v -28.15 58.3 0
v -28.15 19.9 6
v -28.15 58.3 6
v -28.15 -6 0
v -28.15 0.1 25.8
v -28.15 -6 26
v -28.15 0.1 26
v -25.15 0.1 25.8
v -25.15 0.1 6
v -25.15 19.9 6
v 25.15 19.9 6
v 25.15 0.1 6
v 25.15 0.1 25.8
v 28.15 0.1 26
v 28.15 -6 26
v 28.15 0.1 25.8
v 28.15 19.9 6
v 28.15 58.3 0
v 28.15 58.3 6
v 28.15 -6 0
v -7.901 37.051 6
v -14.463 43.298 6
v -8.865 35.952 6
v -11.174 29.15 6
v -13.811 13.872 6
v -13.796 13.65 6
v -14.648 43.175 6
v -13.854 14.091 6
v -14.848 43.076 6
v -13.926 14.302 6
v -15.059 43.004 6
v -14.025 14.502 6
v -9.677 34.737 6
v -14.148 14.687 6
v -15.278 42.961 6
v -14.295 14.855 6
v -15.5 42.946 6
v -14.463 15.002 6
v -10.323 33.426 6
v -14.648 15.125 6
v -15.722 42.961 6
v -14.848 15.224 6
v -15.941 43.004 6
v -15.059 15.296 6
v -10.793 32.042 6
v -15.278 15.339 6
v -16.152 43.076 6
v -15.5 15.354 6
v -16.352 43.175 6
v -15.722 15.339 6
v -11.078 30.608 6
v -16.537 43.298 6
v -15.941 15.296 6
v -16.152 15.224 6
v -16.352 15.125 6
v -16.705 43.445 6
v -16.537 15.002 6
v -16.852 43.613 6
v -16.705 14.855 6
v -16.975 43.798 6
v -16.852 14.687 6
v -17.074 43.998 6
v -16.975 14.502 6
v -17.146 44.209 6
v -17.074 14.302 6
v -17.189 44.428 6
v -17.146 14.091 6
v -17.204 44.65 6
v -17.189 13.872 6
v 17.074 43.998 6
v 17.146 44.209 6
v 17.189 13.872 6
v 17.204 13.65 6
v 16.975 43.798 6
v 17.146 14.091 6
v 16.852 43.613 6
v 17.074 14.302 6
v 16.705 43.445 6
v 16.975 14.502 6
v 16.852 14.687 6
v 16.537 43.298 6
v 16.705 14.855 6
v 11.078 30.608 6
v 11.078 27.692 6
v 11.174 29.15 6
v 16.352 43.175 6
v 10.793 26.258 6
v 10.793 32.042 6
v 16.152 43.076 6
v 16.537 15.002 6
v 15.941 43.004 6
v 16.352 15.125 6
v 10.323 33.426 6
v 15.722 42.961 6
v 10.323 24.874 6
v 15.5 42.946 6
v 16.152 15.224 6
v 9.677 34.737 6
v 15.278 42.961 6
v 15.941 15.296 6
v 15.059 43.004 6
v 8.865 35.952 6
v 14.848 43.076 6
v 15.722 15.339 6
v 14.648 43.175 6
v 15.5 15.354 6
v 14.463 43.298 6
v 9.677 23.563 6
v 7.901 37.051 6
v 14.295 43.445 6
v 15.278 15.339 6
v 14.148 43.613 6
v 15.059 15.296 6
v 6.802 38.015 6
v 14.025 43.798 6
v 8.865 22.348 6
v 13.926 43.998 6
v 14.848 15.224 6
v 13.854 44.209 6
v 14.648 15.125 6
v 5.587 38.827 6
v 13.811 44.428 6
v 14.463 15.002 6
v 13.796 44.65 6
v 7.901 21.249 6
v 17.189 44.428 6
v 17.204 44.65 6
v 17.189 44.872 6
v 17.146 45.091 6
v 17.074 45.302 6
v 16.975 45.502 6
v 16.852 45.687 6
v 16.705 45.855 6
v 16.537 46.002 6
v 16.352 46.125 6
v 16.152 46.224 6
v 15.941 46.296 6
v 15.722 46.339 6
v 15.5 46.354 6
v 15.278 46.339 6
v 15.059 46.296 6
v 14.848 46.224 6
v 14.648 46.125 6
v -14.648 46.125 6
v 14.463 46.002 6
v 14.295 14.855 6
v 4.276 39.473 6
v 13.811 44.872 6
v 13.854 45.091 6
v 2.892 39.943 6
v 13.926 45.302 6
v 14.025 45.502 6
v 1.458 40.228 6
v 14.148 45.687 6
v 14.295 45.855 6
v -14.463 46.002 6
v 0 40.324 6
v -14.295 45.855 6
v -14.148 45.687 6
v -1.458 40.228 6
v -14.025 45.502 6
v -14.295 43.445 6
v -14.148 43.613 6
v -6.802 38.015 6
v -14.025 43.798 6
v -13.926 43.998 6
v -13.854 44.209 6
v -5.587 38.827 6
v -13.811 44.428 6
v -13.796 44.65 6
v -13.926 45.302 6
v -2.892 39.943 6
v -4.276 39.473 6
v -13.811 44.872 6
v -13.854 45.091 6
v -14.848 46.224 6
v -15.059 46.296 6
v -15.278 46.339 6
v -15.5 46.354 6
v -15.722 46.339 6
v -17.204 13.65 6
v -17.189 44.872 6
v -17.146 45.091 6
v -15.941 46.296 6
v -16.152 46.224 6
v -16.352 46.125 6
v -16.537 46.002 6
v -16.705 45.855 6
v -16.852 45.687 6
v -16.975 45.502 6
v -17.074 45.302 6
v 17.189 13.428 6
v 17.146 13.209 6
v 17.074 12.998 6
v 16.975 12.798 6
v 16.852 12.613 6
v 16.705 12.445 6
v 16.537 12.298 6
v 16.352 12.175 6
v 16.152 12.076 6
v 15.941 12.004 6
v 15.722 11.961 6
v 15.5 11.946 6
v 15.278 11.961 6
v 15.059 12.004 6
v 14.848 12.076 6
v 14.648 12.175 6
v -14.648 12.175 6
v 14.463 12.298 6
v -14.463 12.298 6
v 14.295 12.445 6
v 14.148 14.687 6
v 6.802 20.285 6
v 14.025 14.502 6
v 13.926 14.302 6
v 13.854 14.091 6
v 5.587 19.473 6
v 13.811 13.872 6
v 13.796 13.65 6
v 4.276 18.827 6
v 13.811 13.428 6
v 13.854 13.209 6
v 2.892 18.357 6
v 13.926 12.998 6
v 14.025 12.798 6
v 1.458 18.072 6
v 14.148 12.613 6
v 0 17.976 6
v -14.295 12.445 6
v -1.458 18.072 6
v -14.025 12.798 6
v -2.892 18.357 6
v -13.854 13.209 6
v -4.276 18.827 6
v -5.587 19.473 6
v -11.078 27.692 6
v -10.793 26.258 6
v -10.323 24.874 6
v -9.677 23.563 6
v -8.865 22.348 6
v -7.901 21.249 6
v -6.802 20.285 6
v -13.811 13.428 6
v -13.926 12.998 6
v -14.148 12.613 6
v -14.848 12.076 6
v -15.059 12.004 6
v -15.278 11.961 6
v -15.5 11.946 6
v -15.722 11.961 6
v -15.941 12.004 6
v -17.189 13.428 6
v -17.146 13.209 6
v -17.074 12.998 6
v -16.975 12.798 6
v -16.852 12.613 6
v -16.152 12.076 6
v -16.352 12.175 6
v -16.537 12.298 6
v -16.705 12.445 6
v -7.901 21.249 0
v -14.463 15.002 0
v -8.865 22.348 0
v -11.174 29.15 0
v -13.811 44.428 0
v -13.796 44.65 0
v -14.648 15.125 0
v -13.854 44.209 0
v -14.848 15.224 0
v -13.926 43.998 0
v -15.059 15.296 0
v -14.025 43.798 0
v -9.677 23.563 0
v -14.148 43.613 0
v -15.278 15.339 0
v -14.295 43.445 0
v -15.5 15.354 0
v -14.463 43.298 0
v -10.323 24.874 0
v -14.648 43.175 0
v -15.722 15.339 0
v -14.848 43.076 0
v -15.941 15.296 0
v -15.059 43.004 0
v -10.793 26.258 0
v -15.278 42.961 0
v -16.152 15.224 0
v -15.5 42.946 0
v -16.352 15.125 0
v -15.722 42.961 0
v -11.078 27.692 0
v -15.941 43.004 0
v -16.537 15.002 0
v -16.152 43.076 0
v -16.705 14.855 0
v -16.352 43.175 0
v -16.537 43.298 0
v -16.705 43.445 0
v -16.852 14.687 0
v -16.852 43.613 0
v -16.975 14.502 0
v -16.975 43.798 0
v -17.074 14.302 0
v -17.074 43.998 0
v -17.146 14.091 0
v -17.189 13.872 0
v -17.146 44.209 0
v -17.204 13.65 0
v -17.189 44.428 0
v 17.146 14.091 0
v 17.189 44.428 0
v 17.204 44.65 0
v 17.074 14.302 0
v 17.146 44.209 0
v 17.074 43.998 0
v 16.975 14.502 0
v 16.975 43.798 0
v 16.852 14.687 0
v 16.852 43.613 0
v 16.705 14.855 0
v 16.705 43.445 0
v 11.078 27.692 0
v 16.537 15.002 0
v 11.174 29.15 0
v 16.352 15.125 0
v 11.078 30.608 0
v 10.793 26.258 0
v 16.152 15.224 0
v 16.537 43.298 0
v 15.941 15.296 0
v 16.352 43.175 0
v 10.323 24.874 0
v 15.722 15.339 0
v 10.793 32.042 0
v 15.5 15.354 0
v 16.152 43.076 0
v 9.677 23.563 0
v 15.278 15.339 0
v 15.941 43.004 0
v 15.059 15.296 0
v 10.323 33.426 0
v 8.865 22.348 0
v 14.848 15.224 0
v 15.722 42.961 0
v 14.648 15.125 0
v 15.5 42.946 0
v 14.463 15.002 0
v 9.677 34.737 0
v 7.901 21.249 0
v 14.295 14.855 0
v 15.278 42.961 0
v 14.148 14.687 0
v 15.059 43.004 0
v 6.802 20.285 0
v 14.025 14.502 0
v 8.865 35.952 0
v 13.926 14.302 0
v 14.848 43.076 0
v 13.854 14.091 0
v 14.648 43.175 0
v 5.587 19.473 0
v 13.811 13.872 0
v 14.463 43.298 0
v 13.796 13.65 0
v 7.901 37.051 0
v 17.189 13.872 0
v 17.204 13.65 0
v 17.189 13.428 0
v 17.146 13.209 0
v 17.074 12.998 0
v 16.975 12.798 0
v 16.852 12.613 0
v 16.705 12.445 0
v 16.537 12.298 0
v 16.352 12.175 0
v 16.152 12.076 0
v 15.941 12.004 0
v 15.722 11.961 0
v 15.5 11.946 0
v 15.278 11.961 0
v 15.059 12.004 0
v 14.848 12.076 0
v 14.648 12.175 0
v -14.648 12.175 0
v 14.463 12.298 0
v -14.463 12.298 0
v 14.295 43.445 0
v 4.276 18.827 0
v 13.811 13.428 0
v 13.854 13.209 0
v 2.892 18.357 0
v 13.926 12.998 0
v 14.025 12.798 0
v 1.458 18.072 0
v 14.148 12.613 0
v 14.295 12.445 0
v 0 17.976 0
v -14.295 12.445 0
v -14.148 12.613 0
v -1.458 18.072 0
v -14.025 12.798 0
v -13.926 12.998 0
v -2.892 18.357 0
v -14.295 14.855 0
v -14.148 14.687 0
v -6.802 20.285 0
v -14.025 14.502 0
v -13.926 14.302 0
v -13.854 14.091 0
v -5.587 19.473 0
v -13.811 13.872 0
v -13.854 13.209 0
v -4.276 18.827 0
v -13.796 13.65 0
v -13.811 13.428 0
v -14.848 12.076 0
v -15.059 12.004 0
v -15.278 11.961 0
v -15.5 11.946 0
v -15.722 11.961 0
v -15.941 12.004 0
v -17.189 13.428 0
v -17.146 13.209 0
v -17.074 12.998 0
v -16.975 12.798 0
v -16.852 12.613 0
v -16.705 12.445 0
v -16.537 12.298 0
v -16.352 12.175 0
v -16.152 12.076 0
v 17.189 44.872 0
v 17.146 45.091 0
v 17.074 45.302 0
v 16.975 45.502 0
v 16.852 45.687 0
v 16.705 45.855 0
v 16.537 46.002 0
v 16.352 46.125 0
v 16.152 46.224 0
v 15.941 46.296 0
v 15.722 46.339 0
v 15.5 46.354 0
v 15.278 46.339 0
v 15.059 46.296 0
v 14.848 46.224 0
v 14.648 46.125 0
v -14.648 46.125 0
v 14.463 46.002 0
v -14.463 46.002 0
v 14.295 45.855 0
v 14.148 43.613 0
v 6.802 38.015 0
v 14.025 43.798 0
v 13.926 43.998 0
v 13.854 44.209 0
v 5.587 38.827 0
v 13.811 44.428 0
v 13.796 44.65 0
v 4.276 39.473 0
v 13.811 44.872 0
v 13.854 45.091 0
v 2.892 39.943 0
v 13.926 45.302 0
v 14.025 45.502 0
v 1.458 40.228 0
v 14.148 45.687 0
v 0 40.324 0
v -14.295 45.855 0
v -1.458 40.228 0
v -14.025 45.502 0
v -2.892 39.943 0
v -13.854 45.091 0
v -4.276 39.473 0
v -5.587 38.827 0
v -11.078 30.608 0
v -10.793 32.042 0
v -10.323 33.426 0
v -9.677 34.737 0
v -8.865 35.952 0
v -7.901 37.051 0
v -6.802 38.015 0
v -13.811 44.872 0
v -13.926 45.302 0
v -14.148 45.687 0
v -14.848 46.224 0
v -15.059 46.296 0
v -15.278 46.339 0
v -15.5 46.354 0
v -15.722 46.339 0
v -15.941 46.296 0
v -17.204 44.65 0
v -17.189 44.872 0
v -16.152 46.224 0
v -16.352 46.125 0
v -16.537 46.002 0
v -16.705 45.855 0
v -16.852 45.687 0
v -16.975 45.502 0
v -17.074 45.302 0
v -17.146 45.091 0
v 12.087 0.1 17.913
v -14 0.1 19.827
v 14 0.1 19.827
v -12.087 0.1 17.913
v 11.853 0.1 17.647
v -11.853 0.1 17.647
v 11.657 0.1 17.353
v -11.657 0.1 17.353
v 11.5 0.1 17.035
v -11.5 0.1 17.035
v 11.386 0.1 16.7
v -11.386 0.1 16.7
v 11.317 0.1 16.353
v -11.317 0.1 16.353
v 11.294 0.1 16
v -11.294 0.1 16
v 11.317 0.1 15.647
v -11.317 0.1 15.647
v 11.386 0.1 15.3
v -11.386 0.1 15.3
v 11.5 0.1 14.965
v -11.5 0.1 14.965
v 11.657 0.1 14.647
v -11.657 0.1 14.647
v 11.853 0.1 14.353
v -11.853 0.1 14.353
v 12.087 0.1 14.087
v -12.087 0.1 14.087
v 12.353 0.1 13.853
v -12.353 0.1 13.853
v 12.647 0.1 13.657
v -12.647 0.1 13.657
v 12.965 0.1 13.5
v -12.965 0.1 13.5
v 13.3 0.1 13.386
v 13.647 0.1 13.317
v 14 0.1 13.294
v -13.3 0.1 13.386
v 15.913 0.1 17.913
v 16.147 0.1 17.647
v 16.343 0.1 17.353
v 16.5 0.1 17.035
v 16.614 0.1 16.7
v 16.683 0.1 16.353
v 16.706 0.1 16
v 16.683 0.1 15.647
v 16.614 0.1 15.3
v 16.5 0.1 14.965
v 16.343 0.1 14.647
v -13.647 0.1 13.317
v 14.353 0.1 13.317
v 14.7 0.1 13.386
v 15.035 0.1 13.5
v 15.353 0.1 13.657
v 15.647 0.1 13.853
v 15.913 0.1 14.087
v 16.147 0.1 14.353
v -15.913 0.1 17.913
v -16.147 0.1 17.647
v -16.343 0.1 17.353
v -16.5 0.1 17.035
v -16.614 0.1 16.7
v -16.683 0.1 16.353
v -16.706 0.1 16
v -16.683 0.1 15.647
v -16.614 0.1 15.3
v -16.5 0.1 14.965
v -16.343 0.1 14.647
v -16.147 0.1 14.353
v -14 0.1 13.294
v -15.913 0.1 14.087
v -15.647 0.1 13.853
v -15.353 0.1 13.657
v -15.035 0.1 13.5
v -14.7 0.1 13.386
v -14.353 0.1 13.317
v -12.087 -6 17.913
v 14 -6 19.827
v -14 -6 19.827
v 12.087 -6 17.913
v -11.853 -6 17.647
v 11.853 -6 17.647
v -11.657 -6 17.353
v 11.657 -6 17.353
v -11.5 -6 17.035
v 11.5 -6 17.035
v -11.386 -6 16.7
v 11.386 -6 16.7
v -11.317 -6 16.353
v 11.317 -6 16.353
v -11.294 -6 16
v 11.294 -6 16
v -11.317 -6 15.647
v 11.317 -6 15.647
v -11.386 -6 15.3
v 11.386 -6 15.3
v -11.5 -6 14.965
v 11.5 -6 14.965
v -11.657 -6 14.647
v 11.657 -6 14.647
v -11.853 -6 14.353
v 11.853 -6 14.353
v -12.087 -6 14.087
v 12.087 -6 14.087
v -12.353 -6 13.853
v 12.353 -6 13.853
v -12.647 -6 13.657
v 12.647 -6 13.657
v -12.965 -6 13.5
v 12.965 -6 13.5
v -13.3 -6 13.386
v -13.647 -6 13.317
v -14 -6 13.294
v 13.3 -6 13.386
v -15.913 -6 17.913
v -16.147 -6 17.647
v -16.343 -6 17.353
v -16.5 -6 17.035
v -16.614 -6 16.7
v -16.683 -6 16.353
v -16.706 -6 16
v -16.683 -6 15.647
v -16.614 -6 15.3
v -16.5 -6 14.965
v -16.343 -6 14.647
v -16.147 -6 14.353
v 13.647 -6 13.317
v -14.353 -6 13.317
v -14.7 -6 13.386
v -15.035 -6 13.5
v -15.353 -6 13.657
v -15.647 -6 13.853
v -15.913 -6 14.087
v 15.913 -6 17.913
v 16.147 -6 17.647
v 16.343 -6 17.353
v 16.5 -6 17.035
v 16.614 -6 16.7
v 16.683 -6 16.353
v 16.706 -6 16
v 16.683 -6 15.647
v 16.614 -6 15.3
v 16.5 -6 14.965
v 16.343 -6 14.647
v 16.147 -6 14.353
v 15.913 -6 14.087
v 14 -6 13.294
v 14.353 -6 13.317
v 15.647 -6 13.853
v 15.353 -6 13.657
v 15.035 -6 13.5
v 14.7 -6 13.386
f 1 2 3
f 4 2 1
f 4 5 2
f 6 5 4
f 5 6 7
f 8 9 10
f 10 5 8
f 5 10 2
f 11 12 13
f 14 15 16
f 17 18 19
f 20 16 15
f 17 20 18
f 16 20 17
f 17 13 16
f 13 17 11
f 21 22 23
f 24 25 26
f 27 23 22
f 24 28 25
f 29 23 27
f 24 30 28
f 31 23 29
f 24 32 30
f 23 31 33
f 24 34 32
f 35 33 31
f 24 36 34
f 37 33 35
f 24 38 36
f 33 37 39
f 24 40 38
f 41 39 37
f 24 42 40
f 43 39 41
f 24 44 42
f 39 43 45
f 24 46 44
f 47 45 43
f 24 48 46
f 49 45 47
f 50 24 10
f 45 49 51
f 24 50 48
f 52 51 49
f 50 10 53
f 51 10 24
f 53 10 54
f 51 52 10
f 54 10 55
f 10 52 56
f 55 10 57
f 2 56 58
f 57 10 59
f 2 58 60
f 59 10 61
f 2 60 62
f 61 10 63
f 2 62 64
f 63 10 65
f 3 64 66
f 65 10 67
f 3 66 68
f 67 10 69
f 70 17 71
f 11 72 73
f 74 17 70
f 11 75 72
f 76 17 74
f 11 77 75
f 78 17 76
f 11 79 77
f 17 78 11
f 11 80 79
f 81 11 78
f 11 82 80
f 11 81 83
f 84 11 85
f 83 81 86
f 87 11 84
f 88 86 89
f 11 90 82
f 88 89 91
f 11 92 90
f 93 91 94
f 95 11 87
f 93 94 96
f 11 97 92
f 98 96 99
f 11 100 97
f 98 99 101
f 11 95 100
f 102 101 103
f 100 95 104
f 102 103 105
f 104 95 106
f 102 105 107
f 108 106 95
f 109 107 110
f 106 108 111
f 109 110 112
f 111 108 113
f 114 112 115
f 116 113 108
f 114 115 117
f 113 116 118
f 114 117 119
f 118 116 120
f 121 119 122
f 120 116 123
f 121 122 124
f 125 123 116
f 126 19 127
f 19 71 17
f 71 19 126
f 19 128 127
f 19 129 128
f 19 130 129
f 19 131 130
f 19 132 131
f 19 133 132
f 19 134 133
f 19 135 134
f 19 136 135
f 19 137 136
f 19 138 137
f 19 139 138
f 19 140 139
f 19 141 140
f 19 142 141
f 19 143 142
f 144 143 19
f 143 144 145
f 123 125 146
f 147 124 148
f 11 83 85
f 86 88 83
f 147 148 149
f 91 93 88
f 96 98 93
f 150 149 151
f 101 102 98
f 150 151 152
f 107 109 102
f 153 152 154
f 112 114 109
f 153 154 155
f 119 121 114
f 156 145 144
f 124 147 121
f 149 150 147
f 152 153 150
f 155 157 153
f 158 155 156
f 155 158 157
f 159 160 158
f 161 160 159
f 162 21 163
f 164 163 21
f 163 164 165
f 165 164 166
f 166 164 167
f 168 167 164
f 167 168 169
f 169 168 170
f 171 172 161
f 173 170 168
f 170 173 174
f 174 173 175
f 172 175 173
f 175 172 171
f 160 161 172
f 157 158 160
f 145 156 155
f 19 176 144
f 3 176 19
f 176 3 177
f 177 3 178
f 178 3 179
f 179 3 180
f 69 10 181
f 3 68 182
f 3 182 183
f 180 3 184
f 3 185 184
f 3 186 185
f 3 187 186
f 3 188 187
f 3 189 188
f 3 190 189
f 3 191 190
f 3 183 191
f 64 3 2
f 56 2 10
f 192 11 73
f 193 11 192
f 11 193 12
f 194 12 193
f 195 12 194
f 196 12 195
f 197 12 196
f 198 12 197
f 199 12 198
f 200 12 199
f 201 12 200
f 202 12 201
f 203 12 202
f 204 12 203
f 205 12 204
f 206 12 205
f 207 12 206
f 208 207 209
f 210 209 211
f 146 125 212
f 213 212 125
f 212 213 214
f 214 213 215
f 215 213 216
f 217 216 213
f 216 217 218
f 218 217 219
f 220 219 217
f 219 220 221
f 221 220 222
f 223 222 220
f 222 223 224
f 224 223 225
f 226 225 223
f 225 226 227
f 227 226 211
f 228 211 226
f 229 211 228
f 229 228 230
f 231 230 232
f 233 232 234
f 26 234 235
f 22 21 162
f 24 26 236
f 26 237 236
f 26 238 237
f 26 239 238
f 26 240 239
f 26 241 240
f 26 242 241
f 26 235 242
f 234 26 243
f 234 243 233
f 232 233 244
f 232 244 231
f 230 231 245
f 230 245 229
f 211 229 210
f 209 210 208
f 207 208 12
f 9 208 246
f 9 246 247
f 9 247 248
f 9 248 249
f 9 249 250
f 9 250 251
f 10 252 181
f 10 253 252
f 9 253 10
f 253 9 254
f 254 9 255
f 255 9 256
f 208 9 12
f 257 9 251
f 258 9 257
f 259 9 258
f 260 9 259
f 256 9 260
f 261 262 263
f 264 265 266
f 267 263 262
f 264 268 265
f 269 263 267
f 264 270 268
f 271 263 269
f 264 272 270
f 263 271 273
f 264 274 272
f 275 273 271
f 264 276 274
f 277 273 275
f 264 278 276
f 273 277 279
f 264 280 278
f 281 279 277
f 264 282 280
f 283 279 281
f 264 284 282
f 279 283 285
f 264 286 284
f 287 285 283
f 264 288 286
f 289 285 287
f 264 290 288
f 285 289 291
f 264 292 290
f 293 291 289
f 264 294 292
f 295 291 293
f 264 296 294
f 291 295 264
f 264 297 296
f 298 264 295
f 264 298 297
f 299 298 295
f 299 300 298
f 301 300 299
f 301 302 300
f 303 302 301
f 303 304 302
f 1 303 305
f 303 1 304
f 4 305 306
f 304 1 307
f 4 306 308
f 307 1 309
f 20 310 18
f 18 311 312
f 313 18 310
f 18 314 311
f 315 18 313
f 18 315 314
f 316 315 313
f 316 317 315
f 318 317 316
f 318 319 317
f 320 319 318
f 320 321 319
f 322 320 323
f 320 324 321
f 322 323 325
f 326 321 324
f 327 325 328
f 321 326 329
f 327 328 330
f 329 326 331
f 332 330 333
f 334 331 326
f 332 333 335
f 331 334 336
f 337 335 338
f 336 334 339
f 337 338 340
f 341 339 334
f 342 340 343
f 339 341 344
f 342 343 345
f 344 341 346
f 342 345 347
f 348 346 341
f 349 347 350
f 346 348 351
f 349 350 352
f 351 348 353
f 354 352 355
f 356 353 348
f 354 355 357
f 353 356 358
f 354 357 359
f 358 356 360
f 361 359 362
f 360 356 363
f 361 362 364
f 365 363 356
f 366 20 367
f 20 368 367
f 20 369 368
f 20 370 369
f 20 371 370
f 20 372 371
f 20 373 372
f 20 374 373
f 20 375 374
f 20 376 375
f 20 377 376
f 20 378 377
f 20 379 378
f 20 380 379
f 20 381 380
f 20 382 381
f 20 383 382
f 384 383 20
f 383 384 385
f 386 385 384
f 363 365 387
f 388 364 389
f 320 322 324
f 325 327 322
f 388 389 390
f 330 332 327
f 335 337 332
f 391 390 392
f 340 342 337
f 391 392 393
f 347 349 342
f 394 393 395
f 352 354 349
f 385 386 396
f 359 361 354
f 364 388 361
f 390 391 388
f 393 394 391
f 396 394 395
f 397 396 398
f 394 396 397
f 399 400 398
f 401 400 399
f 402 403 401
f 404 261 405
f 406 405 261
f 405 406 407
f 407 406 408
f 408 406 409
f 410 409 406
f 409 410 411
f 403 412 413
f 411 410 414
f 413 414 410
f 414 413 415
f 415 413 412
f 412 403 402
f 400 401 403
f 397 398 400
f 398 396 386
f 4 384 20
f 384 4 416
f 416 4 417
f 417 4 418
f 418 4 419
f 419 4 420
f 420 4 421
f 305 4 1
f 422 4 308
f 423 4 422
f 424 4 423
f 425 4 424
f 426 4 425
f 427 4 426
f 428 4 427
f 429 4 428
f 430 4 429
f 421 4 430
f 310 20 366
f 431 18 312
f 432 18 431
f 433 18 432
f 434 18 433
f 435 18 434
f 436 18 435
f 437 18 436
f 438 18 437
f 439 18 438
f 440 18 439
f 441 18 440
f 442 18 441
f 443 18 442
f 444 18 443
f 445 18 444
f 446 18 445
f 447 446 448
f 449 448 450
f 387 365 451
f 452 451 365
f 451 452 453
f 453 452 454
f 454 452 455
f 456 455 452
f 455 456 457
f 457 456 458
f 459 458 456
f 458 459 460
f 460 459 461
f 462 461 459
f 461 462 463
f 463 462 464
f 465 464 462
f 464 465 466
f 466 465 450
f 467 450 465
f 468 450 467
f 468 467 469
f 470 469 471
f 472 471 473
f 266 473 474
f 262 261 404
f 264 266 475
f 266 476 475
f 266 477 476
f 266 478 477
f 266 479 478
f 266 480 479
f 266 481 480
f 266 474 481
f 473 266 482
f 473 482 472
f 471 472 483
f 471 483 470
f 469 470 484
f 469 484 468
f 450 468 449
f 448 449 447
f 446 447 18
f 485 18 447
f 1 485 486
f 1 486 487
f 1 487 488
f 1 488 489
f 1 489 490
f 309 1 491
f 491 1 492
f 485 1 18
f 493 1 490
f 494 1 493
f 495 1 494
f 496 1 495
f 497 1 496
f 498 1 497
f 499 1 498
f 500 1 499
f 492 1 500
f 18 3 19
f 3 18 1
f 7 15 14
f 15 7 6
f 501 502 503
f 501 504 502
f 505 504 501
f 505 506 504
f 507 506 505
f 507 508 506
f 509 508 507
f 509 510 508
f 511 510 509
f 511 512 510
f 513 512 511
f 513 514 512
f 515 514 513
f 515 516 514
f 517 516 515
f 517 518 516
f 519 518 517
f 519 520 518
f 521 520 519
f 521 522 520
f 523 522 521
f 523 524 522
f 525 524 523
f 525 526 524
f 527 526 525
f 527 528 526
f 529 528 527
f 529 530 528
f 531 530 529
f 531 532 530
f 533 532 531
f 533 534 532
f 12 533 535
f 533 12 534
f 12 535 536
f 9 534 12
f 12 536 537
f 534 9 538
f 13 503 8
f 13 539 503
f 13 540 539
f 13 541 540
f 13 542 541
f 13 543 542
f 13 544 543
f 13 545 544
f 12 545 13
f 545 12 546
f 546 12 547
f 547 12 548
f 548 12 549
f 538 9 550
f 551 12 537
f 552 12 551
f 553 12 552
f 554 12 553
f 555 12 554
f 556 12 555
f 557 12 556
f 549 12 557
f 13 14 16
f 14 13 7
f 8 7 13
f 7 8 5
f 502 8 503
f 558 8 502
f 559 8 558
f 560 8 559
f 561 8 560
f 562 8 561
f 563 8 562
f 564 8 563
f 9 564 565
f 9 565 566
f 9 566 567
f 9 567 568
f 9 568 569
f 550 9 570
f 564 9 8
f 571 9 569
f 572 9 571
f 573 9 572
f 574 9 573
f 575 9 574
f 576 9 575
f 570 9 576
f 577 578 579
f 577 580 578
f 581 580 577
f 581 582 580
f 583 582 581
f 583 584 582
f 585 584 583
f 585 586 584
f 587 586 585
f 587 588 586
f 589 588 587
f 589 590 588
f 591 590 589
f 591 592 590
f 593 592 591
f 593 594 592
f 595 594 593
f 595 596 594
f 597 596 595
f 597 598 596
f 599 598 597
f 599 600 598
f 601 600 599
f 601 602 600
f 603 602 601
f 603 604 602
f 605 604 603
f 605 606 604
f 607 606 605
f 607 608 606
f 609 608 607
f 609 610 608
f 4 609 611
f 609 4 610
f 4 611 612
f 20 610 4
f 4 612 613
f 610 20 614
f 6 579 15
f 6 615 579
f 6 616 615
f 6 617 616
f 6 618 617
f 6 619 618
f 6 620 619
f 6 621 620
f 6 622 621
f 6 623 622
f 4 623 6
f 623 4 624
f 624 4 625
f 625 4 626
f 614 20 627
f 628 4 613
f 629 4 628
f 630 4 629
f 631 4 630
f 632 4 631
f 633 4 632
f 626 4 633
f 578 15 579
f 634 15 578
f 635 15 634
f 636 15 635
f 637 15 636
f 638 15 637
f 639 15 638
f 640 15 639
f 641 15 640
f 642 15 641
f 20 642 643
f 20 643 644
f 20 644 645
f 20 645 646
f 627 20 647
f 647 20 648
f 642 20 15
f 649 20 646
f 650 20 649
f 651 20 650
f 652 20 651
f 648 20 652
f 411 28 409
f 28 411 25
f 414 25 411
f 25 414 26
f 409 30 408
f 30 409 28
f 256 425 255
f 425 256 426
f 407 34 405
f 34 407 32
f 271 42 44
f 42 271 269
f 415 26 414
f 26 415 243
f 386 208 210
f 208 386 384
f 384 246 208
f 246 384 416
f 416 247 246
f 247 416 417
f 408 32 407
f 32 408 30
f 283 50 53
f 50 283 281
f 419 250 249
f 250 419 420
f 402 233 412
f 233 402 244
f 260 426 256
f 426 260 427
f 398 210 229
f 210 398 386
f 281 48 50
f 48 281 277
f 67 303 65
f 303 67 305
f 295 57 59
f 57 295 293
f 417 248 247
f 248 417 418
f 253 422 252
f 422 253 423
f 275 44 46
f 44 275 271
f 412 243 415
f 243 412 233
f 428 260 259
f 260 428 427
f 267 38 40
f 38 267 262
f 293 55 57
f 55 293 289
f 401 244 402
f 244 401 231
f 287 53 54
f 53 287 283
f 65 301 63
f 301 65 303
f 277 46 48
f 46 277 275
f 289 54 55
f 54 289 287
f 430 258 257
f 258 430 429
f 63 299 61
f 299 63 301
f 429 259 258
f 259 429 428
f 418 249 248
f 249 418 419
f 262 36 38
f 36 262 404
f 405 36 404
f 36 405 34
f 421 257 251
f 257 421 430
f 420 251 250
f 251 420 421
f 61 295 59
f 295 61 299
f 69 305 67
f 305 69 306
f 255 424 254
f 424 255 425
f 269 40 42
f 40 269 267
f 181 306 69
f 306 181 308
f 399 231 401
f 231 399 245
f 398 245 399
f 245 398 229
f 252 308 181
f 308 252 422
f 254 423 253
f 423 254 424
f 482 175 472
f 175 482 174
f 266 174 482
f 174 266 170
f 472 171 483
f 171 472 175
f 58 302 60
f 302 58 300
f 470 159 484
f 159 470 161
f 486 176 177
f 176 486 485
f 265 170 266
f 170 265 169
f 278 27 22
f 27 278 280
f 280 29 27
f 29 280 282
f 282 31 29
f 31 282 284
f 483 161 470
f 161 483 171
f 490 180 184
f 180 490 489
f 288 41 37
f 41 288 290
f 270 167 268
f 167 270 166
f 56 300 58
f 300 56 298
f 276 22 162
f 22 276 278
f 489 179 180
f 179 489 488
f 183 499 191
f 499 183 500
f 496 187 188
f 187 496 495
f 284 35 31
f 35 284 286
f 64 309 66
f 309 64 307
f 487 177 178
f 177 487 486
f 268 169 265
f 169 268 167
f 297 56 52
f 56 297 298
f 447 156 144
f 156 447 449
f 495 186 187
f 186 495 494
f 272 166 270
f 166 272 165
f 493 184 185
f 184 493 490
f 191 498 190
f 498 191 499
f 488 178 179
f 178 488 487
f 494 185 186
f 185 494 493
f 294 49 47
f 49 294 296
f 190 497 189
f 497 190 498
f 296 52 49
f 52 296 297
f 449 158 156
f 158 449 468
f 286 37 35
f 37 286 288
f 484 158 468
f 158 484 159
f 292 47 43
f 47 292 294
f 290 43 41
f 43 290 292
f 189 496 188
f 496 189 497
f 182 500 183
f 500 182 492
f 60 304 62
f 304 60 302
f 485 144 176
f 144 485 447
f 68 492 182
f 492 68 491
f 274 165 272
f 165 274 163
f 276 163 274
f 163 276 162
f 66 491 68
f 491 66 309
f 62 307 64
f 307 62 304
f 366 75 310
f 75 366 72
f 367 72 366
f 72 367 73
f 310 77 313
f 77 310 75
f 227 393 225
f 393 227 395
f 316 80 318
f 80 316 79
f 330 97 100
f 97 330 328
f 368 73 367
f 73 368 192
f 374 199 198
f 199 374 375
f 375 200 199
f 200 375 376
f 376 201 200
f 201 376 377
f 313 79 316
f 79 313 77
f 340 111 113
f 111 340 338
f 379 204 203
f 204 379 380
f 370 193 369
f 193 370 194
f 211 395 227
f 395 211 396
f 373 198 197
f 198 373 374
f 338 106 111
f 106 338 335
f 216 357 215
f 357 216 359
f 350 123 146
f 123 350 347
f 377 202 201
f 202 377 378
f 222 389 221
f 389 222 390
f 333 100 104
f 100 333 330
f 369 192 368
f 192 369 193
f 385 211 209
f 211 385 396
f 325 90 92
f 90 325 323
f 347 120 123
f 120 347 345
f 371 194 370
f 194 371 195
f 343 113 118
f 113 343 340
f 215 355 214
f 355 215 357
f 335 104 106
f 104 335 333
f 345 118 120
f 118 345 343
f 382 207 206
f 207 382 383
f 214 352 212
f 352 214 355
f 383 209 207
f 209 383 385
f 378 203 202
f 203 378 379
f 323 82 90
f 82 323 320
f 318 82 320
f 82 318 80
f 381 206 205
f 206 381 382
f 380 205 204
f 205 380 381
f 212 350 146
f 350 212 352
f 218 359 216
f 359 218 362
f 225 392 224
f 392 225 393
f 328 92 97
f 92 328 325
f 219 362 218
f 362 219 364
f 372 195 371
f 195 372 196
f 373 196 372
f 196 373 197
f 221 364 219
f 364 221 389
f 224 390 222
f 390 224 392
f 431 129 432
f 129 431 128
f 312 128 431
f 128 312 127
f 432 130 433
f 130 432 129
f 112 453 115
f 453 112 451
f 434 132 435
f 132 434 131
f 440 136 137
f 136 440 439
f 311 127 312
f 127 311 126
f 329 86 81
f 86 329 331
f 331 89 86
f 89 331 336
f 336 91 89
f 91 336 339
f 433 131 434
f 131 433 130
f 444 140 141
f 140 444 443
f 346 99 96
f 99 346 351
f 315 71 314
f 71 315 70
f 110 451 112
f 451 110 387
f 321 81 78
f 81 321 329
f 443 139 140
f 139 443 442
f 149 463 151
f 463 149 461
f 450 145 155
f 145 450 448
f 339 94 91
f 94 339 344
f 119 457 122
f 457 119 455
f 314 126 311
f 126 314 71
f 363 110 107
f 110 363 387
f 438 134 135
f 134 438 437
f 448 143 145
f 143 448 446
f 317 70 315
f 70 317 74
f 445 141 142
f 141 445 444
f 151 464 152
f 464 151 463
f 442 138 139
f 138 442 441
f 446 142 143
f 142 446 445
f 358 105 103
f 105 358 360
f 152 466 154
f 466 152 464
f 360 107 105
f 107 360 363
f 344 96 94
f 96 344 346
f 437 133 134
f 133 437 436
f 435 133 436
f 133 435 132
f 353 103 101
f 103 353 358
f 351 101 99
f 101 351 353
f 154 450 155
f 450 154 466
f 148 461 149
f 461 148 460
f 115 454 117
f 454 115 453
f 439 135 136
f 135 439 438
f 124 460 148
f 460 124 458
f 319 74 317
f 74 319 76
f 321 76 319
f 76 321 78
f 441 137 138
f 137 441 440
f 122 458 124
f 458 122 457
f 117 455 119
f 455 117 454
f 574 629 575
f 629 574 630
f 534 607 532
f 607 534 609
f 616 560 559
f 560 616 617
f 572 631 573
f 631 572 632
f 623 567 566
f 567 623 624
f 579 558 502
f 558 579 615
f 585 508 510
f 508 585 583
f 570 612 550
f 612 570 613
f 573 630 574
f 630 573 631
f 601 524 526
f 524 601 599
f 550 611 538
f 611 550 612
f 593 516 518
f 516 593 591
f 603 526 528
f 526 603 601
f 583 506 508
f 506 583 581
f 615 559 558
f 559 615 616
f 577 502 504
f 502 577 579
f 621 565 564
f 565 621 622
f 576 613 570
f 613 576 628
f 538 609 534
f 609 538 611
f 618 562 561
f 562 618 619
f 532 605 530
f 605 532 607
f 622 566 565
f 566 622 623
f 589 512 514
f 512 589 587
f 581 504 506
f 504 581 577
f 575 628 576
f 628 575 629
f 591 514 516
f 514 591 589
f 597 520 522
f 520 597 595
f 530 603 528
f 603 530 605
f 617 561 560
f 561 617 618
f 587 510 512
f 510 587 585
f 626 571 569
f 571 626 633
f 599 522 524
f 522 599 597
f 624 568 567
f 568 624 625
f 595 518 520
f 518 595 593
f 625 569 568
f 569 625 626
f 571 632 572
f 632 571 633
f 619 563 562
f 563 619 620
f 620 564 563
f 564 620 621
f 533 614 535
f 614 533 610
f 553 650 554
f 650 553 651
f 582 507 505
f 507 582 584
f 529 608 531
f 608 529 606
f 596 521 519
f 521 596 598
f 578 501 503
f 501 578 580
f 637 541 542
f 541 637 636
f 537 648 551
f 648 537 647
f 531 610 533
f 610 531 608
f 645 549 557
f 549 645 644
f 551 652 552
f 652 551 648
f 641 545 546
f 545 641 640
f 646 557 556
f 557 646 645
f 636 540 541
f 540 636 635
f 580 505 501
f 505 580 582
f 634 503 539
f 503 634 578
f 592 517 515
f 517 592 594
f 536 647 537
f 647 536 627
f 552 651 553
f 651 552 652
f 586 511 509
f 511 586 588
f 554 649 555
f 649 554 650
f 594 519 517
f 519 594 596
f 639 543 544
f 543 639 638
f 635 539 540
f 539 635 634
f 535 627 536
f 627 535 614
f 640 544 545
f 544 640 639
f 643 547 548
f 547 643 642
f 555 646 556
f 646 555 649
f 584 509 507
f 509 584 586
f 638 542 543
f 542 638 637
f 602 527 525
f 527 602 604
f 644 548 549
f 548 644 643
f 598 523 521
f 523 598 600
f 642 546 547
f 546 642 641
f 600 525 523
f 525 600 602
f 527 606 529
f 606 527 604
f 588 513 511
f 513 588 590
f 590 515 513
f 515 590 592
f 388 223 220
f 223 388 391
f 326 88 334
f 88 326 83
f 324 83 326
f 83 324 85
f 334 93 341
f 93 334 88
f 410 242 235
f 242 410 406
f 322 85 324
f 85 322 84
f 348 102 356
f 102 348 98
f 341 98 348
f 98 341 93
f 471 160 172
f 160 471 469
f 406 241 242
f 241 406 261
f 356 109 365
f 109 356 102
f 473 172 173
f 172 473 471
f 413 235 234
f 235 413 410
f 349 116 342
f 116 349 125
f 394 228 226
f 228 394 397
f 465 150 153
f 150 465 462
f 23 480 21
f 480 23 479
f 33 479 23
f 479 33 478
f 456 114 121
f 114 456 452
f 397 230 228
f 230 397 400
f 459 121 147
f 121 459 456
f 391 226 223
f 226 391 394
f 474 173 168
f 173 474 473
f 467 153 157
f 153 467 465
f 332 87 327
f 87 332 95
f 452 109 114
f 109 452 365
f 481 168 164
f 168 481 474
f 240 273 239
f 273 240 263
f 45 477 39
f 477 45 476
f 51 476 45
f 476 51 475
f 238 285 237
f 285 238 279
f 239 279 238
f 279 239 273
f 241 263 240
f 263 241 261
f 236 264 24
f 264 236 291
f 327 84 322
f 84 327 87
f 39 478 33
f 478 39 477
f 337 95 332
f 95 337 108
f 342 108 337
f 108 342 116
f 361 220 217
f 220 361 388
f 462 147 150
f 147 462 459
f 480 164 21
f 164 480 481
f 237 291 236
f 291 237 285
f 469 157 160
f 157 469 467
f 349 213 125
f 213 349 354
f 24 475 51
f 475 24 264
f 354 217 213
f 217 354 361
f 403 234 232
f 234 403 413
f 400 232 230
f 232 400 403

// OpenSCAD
// NEMA 17 L-bracket for the face of a 2020 rail; light mechanisms.
// Print as shown: motor plate flat on the bed, rail flange pointing up.
// No supports: horizontal rail holes have 45-degree teardrop roofs.
// Bolt flange to rail first with two M5 screws, washers and matching T-nuts.
// Motor body sits above the plate, shaft through the large opening;
// insert four M3 screws from underneath. Check motor thread depth (4.5 mm
// in the cited drawing); account for plate and washers when choosing length.
// Motor edge is 8 mm from the flange; gussets clear its body by 4 mm.
// Rail screw heads plus washers must project less than motor_gap.
// Sources: https://www.pololu.com/file/0J714/SY42STH38-1684A.pdf
// https://www.motedis.com/en/Profile-20x20-B-type-slot-6

motor_body = 42.3; // Motor square envelope, mm [42:0.1:43]
motor_spacing = 31; // Motor screw centre spacing, mm [31:0.1:31]
pilot_diameter = 22; // Motor pilot boss diameter, mm [22:0.1:22]
plate_thickness = 6; // Both plates' thickness, mm [5:0.5:8]
motor_gap = 8; // Motor edge to rail flange, mm [8:1:12]
side_margin = 7; // Plate extension beyond motor at each side, mm [7:1:10]
rail_width = 20; // Extrusion face width, mm [20:1:20]
rail_screw_spacing = 28; // Two screws along the same rail slot, mm [24:2:36]
rail_screw_diameter = 5; // T-nut thread diameter, mm [3:2:5]
hole_clearance = 0.4; // Added screw-hole diameter, mm [0.2:0.05:0.4]
pilot_clearance = 0.3; // Added pilot-hole diameter, mm [0.2:0.05:0.4]
gusset_thickness = 3; // Side reinforcement thickness, mm [2:0.5:4]
$fn = 48; // Circular resolution [32:8:64]

width = motor_body+2*side_margin;
length = motor_body+2*motor_gap;
motor_y = motor_gap+motor_body/2;
flange_height = plate_thickness+rail_width;

// Compensate circular facets to preserve the specified minimum clearance.
motor_hole = (3+hole_clearance)/cos(180/$fn);
pilot_hole = (pilot_diameter+pilot_clearance)/cos(180/$fn);

module teardrop(diameter, depth) {
    radius = diameter/(2*cos(180/$fn));
    linear_extrude(height=depth)
        union() {
            circle(r=radius);
            polygon([[-radius/sqrt(2),radius/sqrt(2)],
                     [0,radius*sqrt(2)], [radius/sqrt(2),radius/sqrt(2)]]);
        }
}

color("#b48ef0") difference() {
    union() {
        translate([-width/2,0,0]) cube([width,length,plate_thickness]);
        // Overlap by 0.1 mm so flange and plate are one connected solid.
        translate([-width/2,-plate_thickness,0])
            cube([width,plate_thickness+0.1,flange_height]);
        for (x = [-width/2,width/2-gusset_thickness])
            translate([x,0,plate_thickness-0.1])
                rotate([90,0,90]) linear_extrude(height=gusset_thickness)
                    polygon([[0,0],[rail_width,0],[0,rail_width]]);
    }
    translate([0,motor_y,-1])
        cylinder(h=plate_thickness+2,d=pilot_hole);
    for (x = [-motor_spacing/2,motor_spacing/2])
        for (y = [-motor_spacing/2,motor_spacing/2])
            translate([x,motor_y+y,-1])
                cylinder(h=plate_thickness+2,d=motor_hole);
    for (x = [-rail_screw_spacing/2,rail_screw_spacing/2])
        translate([x,1,plate_thickness+rail_width/2]) rotate([90,0,0])
            teardrop(rail_screw_diameter+hole_clearance,plate_thickness+2);
}
